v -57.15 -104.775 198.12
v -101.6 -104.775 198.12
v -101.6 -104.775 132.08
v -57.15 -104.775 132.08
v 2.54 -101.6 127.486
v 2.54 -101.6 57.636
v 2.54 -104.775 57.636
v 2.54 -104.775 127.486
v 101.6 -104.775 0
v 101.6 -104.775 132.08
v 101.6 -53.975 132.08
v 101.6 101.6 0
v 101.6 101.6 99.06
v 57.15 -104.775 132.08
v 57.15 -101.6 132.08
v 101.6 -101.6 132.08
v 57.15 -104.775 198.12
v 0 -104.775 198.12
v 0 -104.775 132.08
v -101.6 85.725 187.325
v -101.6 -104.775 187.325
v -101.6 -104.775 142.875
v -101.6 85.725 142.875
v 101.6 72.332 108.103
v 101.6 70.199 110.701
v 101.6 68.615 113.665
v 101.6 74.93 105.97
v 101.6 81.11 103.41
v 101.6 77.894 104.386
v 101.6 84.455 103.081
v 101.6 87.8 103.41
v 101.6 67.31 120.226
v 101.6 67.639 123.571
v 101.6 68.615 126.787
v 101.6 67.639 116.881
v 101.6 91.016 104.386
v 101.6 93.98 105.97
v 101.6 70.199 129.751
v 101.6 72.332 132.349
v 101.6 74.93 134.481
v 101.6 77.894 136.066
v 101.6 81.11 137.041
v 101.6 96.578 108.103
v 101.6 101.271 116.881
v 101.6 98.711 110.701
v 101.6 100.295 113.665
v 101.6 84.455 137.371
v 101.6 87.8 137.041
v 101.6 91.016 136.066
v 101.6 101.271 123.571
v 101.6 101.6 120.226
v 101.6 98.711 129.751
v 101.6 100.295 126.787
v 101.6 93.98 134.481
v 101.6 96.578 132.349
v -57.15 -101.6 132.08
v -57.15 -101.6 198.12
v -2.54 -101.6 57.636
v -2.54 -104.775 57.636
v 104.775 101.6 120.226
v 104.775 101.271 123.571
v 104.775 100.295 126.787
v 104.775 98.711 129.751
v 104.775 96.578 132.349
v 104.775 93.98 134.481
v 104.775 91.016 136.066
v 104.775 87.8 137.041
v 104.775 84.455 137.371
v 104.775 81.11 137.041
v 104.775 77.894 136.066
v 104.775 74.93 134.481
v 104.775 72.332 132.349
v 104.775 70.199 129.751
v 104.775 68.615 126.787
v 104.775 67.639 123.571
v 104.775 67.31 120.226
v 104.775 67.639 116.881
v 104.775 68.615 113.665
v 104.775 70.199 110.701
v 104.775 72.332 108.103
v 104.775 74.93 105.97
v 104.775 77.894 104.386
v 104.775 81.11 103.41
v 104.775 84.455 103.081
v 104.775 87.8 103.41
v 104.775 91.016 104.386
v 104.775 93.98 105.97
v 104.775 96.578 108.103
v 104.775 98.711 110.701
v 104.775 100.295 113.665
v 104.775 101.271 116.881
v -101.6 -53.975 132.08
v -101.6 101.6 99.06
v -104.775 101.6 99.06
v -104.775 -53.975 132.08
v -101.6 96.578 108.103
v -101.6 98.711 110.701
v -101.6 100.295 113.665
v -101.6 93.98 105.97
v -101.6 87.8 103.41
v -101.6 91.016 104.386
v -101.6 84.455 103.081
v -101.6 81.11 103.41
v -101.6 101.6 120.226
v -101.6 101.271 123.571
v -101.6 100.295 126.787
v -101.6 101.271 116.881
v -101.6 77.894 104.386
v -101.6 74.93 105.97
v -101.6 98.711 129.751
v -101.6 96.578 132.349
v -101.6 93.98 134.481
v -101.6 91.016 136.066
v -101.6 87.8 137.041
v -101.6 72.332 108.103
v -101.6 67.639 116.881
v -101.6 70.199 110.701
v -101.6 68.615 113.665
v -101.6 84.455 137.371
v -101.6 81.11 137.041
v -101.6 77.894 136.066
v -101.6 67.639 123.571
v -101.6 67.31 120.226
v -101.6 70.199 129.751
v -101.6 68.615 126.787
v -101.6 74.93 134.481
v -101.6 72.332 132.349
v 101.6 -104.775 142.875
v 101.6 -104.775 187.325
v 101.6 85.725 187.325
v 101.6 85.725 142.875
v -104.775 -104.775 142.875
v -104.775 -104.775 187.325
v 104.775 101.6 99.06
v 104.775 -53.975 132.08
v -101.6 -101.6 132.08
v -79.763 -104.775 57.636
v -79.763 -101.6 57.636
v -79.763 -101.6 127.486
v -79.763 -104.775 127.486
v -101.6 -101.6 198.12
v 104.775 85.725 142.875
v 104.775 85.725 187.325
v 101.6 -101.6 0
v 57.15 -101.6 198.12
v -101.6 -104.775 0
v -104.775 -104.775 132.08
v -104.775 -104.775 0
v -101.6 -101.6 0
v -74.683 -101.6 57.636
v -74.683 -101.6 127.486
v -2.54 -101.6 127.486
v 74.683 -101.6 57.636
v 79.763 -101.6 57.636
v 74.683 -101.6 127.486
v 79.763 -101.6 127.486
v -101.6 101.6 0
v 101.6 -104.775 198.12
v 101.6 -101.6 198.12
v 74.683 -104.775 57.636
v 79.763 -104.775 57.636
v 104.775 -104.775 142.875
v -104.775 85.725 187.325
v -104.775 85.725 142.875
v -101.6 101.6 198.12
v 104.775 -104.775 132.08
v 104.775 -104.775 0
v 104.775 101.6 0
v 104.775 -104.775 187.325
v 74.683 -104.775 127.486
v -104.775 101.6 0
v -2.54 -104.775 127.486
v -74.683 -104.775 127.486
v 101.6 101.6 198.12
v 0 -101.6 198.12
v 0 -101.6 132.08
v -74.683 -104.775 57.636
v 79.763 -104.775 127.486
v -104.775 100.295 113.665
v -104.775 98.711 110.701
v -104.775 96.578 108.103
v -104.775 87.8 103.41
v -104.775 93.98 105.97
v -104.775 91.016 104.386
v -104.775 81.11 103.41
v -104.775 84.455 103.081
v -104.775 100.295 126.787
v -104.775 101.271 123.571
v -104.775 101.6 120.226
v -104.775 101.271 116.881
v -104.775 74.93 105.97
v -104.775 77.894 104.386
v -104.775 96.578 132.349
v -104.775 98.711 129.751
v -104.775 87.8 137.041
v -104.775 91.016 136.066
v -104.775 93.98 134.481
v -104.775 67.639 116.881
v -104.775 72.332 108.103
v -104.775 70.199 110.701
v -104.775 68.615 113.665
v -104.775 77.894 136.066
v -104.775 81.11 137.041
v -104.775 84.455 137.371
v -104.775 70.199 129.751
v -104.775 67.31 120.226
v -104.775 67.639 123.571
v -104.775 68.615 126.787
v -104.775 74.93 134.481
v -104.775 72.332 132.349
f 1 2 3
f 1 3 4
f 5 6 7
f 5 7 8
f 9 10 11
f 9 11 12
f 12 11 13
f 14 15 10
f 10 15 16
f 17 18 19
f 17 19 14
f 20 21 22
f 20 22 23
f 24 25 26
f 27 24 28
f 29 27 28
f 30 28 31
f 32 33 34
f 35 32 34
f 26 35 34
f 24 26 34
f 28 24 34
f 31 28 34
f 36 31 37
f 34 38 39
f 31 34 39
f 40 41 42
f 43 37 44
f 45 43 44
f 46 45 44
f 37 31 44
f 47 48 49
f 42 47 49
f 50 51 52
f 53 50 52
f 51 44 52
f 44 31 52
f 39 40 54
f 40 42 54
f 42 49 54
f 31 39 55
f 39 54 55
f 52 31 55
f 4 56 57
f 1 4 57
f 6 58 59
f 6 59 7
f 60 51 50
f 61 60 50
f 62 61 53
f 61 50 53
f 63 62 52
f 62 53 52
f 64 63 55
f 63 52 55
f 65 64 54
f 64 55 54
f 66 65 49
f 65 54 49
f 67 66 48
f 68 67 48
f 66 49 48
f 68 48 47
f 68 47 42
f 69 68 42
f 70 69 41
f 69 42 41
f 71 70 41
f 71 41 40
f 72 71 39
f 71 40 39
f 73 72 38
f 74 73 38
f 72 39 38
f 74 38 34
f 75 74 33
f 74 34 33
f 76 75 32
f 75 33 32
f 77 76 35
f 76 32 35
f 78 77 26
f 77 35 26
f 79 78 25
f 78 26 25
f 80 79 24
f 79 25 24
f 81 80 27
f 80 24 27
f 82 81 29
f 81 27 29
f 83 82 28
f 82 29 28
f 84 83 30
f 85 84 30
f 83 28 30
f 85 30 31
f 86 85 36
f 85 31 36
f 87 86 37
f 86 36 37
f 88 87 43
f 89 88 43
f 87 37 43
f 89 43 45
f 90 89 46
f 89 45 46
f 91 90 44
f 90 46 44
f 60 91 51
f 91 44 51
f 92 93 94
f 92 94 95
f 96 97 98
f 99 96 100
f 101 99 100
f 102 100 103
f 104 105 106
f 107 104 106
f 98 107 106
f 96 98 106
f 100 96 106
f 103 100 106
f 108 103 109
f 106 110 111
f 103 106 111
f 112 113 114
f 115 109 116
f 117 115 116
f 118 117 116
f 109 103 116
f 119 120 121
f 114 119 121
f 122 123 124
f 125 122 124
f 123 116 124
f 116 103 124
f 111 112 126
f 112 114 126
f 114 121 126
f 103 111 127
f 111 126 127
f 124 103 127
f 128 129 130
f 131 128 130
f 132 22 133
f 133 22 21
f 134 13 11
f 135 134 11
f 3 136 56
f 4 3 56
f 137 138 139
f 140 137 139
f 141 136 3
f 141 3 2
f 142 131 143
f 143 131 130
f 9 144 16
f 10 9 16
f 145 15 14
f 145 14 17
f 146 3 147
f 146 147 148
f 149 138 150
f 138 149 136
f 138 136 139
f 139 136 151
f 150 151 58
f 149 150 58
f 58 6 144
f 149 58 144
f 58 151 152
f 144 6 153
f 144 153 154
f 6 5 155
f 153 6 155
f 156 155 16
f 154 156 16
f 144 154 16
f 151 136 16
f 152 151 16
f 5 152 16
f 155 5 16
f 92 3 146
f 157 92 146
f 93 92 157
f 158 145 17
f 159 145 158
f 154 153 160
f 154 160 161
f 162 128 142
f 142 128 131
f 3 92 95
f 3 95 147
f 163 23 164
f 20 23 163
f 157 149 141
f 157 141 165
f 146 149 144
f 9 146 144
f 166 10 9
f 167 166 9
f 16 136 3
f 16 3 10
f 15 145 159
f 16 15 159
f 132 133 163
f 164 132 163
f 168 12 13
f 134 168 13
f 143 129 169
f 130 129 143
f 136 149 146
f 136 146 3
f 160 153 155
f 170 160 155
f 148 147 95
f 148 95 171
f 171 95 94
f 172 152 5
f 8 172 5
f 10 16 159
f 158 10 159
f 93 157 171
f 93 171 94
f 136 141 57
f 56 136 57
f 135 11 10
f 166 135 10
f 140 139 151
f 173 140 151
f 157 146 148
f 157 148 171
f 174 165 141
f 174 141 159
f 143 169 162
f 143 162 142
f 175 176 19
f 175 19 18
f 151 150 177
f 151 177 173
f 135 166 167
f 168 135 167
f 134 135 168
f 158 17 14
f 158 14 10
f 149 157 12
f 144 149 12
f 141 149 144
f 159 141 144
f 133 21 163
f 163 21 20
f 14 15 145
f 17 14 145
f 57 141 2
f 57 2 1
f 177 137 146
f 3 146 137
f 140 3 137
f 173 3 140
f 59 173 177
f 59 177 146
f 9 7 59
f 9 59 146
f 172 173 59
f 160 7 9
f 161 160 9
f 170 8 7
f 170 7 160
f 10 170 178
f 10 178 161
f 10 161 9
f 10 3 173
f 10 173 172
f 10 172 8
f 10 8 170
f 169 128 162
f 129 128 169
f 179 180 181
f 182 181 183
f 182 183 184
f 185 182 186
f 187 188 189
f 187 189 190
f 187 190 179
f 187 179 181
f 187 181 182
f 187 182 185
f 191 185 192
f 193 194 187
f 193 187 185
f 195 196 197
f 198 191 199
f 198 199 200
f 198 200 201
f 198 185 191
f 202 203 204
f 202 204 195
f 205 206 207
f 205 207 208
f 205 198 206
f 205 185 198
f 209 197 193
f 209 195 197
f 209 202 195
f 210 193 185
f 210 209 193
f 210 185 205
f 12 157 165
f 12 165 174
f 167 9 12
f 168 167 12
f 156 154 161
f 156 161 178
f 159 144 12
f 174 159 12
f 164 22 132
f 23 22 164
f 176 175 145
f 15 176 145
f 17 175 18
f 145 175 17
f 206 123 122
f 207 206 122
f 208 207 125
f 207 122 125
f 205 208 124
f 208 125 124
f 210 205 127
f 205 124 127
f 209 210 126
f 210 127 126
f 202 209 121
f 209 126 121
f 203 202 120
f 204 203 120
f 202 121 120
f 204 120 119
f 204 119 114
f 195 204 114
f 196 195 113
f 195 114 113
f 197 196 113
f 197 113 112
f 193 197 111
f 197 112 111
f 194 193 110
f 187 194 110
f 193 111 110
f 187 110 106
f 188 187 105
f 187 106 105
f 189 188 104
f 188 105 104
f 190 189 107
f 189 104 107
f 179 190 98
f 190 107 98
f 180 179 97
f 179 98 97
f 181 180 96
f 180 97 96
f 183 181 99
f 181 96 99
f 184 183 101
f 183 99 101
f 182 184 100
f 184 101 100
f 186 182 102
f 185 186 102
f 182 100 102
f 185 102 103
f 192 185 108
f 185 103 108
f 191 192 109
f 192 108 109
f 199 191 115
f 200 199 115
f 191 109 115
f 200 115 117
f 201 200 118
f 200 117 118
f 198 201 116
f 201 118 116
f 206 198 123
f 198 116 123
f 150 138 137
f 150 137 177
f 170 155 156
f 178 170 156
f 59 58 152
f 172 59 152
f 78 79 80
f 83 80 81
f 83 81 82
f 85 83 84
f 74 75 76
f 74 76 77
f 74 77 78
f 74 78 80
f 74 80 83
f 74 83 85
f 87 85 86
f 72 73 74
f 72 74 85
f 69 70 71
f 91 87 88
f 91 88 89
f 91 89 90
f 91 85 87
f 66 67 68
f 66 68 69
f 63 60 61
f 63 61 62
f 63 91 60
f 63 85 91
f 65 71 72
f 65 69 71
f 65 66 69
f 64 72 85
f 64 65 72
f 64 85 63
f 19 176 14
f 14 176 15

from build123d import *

# Parameters (mm, degrees)
F0_W      = 203.2
F0_H      = 203.2
F1_DEPTH  = 198.12
F2_W      = 203.2
F2_H      = 132.08
F2_W_2    = 5.08
F2_H_2    = 69.85
F3_DEPTH  = 3.175
F4_W      = 44.45
F4_H      = 66.04
F5_DEPTH  = 3.175
F6_W      = 57.15
F6_H      = 66.04
F7_DEPTH  = 3.175
F8_W      = 190.5
F8_H      = 44.45
F9_DEPTH  = 3.175
F11_DEPTH = 3.175
F13_R     = 17.145
F14_DEPTH = 3.175
F15_R     = 17.145
F16_DEPTH = 3.175


with BuildPart() as f1:
    # F0 (on Top) → F1 (new body)
    with BuildSketch(Plane.XY):
        Rectangle(F0_W, F0_H)
    extrude(amount=F1_DEPTH)


with BuildPart() as f3:
    # F2 (on face) → F3 (new body)
    with BuildSketch(Plane.XZ.offset(101.6)):
        with Locations((0, 66.04)):
            Rectangle(F2_W, F2_H)
        with Locations((-77.222839, 92.560843)):
            Rectangle(F2_W_2, F2_H_2, mode=Mode.SUBTRACT)
        with Locations((0, 92.560843)):
            Rectangle(F2_W_2, F2_H_2, mode=Mode.SUBTRACT)
        with Locations((77.222839, 92.560843)):
            Rectangle(F2_W_2, F2_H_2, mode=Mode.SUBTRACT)
    extrude(amount=F3_DEPTH)


with BuildPart() as f5:
    # F4 (on face) → F5 (new body)
    with BuildSketch(Plane.XZ.offset(101.6)):
        with Locations((-79.375, 165.1)):
            Rectangle(F4_W, F4_H)
        with Locations((79.375, 165.1)):
            Rectangle(F4_W, F4_H)
    extrude(amount=F5_DEPTH)


with BuildPart() as f7:
    # F6 (on face) → F7 (new body)
    with BuildSketch(Plane.XZ.offset(101.6)):
        with Locations((28.575, 165.1)):
            Rectangle(F6_W, F6_H)
    extrude(amount=F7_DEPTH)


with BuildPart() as f9:
    # F8 (on face) → F9 (new body)
    with BuildSketch(Plane.YZ.offset(101.6)):
        with Locations((-9.525, 165.1)):
            Rectangle(F8_W, F8_H)
    extrude(amount=F9_DEPTH)


with BuildPart() as f11:
    # F10 (on face) → F11 (new body)
    with BuildSketch(Plane.YZ.offset(101.6)):
        Polygon((-53.975, 132.08), (-104.775, 132.08), (-104.775, 0), (101.6, 0), (101.6, 99.06), align=None)
    extrude(amount=F11_DEPTH)


with BuildPart() as f12_1:
    # F12: instance of F11
    add(f11.part.mirror(Plane(origin=(0, -103.1875, 165.1), x_dir=(0, -1, 0), z_dir=(-1, 0, 0))))


with BuildPart() as f12_2:
    # F12: instance of F9
    add(f9.part.mirror(Plane(origin=(0, -103.1875, 165.1), x_dir=(0, -1, 0), z_dir=(-1, 0, 0))))


with BuildPart() as f14:
    # F13 (on face) → F14 (new body)
    with BuildSketch(Plane.YZ.offset(101.6)):
        with Locations((84.455, 120.225858)):
            Circle(F13_R)
    extrude(amount=F14_DEPTH)


with BuildPart() as f16:
    # F15 (on face) → F16 (new body)
    with BuildSketch(Plane(origin=(-101.6, 0, 0), x_dir=(0, -1, 0), z_dir=(-1, 0, 0))):
        with Locations((-84.455, 120.225858)):
            Circle(F15_R)
    extrude(amount=F16_DEPTH)


solid = Compound([f1.part, f3.part, f5.part, f7.part, f9.part, f11.part, f12_1.part, f12_2.part, f14.part, f16.part])
